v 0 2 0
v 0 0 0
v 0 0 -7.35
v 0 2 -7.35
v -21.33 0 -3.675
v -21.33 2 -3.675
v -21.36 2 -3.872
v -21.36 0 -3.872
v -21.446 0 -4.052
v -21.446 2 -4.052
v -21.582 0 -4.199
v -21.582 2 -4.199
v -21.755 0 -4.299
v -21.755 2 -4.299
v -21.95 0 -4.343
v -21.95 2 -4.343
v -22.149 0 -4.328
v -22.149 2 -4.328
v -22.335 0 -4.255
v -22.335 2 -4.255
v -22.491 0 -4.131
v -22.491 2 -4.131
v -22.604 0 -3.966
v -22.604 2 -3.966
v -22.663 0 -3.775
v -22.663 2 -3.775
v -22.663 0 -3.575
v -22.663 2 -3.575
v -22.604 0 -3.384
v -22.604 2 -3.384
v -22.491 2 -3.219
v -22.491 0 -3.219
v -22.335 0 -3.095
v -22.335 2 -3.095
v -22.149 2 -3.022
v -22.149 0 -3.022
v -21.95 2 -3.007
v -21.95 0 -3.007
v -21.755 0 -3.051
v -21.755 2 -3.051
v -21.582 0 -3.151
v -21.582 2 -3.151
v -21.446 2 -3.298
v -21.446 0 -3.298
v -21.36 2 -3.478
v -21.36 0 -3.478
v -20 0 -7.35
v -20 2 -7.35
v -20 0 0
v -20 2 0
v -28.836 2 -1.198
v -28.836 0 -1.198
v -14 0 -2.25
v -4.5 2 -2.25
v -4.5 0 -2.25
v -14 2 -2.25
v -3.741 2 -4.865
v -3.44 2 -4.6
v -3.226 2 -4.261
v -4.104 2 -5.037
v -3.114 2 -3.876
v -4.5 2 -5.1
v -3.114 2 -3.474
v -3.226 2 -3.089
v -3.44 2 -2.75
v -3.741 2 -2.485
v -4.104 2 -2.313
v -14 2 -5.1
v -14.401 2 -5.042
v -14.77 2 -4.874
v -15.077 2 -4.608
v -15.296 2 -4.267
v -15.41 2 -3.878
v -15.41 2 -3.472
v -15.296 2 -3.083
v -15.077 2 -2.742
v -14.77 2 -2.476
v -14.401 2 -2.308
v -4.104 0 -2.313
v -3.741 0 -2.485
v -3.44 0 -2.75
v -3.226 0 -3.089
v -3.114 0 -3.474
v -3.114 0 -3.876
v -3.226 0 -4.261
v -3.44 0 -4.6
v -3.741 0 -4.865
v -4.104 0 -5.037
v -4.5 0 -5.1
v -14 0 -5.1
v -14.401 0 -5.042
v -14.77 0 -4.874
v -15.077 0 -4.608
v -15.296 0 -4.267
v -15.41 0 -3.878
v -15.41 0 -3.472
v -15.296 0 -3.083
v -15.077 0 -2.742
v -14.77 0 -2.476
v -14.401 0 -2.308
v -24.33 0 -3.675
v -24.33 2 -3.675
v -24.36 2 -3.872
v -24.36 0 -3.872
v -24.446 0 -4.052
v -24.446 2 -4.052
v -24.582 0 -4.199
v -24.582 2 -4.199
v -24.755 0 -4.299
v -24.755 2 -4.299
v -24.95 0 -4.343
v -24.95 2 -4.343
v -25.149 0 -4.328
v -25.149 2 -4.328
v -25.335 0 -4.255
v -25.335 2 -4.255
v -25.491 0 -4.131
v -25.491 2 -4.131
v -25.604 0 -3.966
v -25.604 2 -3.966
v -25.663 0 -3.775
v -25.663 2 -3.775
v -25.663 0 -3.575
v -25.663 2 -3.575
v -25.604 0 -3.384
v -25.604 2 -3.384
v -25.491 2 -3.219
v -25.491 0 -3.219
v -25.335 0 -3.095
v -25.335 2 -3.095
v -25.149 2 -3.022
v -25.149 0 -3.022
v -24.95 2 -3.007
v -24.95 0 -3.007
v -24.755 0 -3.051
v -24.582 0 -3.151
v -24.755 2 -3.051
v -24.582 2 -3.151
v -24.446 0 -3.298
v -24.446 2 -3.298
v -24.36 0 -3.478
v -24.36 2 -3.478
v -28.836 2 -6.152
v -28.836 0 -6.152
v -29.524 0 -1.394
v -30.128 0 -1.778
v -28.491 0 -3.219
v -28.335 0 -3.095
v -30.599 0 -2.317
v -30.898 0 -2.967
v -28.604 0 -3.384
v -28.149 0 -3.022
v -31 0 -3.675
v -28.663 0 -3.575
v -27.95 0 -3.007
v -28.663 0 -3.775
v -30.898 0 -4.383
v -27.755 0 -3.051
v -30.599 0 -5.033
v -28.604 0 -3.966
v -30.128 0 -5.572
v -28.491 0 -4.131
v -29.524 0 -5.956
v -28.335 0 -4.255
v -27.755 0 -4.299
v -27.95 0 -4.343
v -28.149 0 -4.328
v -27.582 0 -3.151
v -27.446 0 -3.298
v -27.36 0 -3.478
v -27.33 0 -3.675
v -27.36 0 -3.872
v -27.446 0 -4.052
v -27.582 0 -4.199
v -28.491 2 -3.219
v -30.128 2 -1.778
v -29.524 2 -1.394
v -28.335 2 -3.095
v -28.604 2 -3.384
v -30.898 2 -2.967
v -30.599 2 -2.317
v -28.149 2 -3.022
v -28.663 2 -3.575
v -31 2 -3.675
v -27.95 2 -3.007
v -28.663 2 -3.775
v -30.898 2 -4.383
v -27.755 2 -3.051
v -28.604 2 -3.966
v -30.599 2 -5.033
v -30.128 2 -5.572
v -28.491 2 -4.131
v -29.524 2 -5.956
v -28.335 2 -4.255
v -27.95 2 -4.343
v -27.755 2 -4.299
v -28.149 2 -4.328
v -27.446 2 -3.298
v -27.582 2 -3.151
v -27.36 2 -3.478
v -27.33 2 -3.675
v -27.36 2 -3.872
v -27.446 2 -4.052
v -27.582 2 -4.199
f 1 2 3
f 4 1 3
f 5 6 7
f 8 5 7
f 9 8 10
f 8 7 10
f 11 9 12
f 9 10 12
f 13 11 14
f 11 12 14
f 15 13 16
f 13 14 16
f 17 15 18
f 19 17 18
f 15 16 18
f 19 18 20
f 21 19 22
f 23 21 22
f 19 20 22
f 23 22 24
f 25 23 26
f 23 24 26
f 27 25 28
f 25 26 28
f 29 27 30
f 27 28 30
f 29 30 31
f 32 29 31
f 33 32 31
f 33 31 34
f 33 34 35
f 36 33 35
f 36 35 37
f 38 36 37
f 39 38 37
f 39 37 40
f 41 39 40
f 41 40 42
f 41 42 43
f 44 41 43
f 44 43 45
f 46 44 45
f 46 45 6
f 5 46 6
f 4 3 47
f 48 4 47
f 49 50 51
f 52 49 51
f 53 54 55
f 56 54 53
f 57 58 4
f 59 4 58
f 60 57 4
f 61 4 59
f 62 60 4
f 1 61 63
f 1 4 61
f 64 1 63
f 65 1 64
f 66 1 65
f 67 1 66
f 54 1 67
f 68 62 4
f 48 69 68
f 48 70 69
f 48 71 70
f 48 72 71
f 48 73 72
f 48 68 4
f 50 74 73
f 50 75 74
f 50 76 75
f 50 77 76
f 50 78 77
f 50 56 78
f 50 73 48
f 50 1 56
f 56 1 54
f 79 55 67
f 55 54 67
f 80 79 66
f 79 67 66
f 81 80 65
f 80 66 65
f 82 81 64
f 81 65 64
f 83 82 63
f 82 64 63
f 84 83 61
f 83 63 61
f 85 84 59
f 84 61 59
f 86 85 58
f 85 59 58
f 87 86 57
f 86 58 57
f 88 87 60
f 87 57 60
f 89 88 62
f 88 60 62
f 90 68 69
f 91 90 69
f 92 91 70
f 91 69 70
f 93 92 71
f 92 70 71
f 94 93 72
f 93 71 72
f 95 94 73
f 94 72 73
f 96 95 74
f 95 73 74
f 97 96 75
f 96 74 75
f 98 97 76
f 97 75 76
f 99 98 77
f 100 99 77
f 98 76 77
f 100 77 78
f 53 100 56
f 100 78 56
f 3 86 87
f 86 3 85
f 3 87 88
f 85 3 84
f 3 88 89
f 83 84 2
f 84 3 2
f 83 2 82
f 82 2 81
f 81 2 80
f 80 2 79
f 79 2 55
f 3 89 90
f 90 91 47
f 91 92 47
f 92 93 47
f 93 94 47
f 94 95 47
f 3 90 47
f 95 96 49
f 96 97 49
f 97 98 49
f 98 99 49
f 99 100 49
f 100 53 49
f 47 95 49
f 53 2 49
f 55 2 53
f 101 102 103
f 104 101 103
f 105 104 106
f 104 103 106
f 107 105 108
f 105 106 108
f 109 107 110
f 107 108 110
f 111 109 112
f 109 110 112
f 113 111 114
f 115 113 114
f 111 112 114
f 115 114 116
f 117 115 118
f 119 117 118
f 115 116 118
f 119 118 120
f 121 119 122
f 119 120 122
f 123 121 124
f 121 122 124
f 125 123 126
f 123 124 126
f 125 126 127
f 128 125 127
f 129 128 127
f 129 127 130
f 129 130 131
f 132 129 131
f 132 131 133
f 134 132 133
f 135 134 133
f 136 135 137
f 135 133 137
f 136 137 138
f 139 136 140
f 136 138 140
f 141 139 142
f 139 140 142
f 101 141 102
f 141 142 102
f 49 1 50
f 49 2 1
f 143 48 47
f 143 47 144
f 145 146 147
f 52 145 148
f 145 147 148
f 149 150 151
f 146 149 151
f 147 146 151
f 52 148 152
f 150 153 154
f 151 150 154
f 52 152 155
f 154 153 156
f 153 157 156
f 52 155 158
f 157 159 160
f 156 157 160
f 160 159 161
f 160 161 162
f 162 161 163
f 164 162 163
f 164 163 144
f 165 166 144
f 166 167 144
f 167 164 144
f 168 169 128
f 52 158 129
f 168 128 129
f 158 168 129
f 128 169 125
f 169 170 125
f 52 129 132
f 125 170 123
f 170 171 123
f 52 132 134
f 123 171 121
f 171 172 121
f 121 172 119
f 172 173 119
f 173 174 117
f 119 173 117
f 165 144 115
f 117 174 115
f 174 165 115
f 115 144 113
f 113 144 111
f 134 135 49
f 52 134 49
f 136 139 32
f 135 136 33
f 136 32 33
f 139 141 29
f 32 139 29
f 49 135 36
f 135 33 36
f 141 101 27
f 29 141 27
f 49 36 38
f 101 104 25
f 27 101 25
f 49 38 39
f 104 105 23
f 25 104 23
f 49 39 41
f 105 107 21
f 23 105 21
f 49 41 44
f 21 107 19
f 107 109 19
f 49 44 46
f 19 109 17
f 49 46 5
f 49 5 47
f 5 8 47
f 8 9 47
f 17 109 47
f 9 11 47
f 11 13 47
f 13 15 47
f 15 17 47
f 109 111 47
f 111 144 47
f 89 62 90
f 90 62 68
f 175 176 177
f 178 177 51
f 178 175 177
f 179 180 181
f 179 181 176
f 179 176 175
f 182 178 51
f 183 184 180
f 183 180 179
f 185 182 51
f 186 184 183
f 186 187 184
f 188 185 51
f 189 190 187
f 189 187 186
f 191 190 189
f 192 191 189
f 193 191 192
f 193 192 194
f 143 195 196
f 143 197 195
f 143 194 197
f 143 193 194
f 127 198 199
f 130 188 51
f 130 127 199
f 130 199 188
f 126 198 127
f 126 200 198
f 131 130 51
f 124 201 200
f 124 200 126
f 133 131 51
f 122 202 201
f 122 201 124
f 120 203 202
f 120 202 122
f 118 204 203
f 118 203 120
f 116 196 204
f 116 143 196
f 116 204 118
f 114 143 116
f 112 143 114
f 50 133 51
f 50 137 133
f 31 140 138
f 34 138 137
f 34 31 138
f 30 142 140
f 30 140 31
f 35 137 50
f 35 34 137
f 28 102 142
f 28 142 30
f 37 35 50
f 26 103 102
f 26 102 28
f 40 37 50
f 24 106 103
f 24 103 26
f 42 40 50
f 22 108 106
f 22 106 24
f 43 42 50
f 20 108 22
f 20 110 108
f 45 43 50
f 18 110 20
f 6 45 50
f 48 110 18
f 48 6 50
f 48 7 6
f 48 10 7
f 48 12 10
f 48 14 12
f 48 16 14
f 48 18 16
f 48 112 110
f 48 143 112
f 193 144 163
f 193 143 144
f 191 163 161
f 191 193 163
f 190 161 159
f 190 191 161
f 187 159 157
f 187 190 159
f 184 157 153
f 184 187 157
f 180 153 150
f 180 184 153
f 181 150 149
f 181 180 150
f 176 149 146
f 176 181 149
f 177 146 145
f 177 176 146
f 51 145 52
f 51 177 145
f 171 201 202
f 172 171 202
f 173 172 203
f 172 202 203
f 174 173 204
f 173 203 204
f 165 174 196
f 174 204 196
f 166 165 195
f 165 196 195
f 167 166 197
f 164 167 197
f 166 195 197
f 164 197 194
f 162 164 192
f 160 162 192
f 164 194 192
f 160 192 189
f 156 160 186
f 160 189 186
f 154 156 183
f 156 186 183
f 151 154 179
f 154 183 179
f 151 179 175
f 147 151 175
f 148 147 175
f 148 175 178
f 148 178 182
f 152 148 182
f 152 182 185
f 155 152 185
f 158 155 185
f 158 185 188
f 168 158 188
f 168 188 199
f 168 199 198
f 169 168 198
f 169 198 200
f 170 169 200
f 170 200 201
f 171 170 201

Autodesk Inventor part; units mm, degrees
ref_plane "YZ Plane" through (0, 0, 0) normal (1, 0, 0) x (0, 1, 0)
ref_plane "XZ Plane" through (0, 0, 0) normal (0, 1, 0) x (-1, 0, 0)
ref_plane "XY Plane" through (0, 0, 0) normal (0, 0, 1) x (1, 0, 0)
sketch "Sketch1" plane through (0, 0, 0) normal (0, 1, 0) x (-1, 0, 0)
  line L0 (0, 0) -> (20, 0)
  line L1 (0, 0) -> (0, -7.35)
  line L2 (0, -7.35) -> (20, -7.35)
  circle A0 centre (28, -3.675) radius 3
  line L3 (20, -7.35) -> (28, -6.675)
  line L4 (20, 0) -> (28, -0.675)
  dimension "d0" = 20
  dimension "d1" = 7.35
extrude "Extrusion1" add sketch "Sketch1" along normal blind 2
sketch "Sketch3" plane through (0, 2, 0) normal (0, 1, 0) x (1, 0, 0)
  line L0 (0, 0) -> (0, 7.35) projected
  line L1 (-4.5, 2.25) -> (-14, 2.25)
  line L2 (0, 0) -> (0, 3.68)
  line L3 (0, 0) -> (0, 5.1)
  line L4 (-4.5, 5.1) -> (-14, 5.1)
  line L5 (0, 7.35) -> (-20, 7.35) projected
  line L6 (-20, 0) -> (0, 0) projected
  arc A0 (-14, 5.1) -> (-14, 2.25) centre (-14, 3.675) ccw
  arc A1 (-4.5, 2.25) -> (-4.5, 5.1) centre (-4.525, 3.675) ccw
extrude "Extrusion3" cut sketch "Sketch3" against normal blind 10
sketch "Sketch4" plane through (0, 2, 0) normal (0, 1, 0) x (1, 0, 0)
  line L0 (0, 0) -> (-28, 0)
  line L1 (-20, 0) -> (0, 0) projected
  arc A0 (-28, 6.675) -> (-28, 0.675) centre (-28, 3.675) ccw projected
  line L2 (-28, 0) -> (-28, 6.675)
  dimension "d20" = 28
extrude "Extrusion4" cut sketch "Sketch4" against normal blind 10
sketch "Sketch5" plane through (0, 2, 0) normal (0, 1, 0) x (1, 0, 0)
  line L0 (-28, 0.675) -> (-20, 0) projected
  line L1 (-20, 0) -> (-20, 7.35)
  line L2 (-20, 7.35) -> (-28, 6.675) projected
  line L3 (-20, 7.35) -> (-28, 6.675)
  line L4 (-28, 6.675) -> (-28, 0.675)
  line L5 (-28, 0.675) -> (-20, 0)
  point P0 (0, 0)
extrude "Extrusion5" cut sketch "Sketch5" against normal blind 10
sketch "Sketch7" plane through (0, 2, 0) normal (0, 1, 0) x (1, 0, 0)
  line L0 (0, 0) -> (0, 3.675)
  circle A0 centre (-28.5, 3.675) radius 2.5
  line L1 (-20, 0) -> (0, 0) projected
  line L2 (-20, 0) -> (-28.8358, 1.1977)
  line L3 (0, 7.35) -> (-20, 7.35) projected
  line L4 (-20, 7.35) -> (-28.8358, 6.1523)
  line L5 (-20, 7.35) -> (-20, 0) projected
  line L6 (-20, 7.35) -> (-20, 0)
  dimension "d42" = 5
extrude "Extrusion6" add sketch "Sketch7" against normal blind 2
sketch "Sketch8" plane through (0, 2, 0) normal (0, 1, 0) x (1, 0, 0)
  line L0 (0, 0) -> (0, 7.35) projected
  circle A0 centre (-22, 3.675) radius 0.67
  circle A1 centre (-25, 3.675) radius 0.67
  circle A2 centre (-28, 3.675) radius 0.67
  dimension "d46" = 1.34
  dimension "d48" = 1.34
  dimension "d50" = 1.34
extrude "Extrusion7" cut sketch "Sketch8" against normal blind 2
properties part number "MMAE 232 Assignment 2_Servo Horn 1 - Dylan Tamras"
